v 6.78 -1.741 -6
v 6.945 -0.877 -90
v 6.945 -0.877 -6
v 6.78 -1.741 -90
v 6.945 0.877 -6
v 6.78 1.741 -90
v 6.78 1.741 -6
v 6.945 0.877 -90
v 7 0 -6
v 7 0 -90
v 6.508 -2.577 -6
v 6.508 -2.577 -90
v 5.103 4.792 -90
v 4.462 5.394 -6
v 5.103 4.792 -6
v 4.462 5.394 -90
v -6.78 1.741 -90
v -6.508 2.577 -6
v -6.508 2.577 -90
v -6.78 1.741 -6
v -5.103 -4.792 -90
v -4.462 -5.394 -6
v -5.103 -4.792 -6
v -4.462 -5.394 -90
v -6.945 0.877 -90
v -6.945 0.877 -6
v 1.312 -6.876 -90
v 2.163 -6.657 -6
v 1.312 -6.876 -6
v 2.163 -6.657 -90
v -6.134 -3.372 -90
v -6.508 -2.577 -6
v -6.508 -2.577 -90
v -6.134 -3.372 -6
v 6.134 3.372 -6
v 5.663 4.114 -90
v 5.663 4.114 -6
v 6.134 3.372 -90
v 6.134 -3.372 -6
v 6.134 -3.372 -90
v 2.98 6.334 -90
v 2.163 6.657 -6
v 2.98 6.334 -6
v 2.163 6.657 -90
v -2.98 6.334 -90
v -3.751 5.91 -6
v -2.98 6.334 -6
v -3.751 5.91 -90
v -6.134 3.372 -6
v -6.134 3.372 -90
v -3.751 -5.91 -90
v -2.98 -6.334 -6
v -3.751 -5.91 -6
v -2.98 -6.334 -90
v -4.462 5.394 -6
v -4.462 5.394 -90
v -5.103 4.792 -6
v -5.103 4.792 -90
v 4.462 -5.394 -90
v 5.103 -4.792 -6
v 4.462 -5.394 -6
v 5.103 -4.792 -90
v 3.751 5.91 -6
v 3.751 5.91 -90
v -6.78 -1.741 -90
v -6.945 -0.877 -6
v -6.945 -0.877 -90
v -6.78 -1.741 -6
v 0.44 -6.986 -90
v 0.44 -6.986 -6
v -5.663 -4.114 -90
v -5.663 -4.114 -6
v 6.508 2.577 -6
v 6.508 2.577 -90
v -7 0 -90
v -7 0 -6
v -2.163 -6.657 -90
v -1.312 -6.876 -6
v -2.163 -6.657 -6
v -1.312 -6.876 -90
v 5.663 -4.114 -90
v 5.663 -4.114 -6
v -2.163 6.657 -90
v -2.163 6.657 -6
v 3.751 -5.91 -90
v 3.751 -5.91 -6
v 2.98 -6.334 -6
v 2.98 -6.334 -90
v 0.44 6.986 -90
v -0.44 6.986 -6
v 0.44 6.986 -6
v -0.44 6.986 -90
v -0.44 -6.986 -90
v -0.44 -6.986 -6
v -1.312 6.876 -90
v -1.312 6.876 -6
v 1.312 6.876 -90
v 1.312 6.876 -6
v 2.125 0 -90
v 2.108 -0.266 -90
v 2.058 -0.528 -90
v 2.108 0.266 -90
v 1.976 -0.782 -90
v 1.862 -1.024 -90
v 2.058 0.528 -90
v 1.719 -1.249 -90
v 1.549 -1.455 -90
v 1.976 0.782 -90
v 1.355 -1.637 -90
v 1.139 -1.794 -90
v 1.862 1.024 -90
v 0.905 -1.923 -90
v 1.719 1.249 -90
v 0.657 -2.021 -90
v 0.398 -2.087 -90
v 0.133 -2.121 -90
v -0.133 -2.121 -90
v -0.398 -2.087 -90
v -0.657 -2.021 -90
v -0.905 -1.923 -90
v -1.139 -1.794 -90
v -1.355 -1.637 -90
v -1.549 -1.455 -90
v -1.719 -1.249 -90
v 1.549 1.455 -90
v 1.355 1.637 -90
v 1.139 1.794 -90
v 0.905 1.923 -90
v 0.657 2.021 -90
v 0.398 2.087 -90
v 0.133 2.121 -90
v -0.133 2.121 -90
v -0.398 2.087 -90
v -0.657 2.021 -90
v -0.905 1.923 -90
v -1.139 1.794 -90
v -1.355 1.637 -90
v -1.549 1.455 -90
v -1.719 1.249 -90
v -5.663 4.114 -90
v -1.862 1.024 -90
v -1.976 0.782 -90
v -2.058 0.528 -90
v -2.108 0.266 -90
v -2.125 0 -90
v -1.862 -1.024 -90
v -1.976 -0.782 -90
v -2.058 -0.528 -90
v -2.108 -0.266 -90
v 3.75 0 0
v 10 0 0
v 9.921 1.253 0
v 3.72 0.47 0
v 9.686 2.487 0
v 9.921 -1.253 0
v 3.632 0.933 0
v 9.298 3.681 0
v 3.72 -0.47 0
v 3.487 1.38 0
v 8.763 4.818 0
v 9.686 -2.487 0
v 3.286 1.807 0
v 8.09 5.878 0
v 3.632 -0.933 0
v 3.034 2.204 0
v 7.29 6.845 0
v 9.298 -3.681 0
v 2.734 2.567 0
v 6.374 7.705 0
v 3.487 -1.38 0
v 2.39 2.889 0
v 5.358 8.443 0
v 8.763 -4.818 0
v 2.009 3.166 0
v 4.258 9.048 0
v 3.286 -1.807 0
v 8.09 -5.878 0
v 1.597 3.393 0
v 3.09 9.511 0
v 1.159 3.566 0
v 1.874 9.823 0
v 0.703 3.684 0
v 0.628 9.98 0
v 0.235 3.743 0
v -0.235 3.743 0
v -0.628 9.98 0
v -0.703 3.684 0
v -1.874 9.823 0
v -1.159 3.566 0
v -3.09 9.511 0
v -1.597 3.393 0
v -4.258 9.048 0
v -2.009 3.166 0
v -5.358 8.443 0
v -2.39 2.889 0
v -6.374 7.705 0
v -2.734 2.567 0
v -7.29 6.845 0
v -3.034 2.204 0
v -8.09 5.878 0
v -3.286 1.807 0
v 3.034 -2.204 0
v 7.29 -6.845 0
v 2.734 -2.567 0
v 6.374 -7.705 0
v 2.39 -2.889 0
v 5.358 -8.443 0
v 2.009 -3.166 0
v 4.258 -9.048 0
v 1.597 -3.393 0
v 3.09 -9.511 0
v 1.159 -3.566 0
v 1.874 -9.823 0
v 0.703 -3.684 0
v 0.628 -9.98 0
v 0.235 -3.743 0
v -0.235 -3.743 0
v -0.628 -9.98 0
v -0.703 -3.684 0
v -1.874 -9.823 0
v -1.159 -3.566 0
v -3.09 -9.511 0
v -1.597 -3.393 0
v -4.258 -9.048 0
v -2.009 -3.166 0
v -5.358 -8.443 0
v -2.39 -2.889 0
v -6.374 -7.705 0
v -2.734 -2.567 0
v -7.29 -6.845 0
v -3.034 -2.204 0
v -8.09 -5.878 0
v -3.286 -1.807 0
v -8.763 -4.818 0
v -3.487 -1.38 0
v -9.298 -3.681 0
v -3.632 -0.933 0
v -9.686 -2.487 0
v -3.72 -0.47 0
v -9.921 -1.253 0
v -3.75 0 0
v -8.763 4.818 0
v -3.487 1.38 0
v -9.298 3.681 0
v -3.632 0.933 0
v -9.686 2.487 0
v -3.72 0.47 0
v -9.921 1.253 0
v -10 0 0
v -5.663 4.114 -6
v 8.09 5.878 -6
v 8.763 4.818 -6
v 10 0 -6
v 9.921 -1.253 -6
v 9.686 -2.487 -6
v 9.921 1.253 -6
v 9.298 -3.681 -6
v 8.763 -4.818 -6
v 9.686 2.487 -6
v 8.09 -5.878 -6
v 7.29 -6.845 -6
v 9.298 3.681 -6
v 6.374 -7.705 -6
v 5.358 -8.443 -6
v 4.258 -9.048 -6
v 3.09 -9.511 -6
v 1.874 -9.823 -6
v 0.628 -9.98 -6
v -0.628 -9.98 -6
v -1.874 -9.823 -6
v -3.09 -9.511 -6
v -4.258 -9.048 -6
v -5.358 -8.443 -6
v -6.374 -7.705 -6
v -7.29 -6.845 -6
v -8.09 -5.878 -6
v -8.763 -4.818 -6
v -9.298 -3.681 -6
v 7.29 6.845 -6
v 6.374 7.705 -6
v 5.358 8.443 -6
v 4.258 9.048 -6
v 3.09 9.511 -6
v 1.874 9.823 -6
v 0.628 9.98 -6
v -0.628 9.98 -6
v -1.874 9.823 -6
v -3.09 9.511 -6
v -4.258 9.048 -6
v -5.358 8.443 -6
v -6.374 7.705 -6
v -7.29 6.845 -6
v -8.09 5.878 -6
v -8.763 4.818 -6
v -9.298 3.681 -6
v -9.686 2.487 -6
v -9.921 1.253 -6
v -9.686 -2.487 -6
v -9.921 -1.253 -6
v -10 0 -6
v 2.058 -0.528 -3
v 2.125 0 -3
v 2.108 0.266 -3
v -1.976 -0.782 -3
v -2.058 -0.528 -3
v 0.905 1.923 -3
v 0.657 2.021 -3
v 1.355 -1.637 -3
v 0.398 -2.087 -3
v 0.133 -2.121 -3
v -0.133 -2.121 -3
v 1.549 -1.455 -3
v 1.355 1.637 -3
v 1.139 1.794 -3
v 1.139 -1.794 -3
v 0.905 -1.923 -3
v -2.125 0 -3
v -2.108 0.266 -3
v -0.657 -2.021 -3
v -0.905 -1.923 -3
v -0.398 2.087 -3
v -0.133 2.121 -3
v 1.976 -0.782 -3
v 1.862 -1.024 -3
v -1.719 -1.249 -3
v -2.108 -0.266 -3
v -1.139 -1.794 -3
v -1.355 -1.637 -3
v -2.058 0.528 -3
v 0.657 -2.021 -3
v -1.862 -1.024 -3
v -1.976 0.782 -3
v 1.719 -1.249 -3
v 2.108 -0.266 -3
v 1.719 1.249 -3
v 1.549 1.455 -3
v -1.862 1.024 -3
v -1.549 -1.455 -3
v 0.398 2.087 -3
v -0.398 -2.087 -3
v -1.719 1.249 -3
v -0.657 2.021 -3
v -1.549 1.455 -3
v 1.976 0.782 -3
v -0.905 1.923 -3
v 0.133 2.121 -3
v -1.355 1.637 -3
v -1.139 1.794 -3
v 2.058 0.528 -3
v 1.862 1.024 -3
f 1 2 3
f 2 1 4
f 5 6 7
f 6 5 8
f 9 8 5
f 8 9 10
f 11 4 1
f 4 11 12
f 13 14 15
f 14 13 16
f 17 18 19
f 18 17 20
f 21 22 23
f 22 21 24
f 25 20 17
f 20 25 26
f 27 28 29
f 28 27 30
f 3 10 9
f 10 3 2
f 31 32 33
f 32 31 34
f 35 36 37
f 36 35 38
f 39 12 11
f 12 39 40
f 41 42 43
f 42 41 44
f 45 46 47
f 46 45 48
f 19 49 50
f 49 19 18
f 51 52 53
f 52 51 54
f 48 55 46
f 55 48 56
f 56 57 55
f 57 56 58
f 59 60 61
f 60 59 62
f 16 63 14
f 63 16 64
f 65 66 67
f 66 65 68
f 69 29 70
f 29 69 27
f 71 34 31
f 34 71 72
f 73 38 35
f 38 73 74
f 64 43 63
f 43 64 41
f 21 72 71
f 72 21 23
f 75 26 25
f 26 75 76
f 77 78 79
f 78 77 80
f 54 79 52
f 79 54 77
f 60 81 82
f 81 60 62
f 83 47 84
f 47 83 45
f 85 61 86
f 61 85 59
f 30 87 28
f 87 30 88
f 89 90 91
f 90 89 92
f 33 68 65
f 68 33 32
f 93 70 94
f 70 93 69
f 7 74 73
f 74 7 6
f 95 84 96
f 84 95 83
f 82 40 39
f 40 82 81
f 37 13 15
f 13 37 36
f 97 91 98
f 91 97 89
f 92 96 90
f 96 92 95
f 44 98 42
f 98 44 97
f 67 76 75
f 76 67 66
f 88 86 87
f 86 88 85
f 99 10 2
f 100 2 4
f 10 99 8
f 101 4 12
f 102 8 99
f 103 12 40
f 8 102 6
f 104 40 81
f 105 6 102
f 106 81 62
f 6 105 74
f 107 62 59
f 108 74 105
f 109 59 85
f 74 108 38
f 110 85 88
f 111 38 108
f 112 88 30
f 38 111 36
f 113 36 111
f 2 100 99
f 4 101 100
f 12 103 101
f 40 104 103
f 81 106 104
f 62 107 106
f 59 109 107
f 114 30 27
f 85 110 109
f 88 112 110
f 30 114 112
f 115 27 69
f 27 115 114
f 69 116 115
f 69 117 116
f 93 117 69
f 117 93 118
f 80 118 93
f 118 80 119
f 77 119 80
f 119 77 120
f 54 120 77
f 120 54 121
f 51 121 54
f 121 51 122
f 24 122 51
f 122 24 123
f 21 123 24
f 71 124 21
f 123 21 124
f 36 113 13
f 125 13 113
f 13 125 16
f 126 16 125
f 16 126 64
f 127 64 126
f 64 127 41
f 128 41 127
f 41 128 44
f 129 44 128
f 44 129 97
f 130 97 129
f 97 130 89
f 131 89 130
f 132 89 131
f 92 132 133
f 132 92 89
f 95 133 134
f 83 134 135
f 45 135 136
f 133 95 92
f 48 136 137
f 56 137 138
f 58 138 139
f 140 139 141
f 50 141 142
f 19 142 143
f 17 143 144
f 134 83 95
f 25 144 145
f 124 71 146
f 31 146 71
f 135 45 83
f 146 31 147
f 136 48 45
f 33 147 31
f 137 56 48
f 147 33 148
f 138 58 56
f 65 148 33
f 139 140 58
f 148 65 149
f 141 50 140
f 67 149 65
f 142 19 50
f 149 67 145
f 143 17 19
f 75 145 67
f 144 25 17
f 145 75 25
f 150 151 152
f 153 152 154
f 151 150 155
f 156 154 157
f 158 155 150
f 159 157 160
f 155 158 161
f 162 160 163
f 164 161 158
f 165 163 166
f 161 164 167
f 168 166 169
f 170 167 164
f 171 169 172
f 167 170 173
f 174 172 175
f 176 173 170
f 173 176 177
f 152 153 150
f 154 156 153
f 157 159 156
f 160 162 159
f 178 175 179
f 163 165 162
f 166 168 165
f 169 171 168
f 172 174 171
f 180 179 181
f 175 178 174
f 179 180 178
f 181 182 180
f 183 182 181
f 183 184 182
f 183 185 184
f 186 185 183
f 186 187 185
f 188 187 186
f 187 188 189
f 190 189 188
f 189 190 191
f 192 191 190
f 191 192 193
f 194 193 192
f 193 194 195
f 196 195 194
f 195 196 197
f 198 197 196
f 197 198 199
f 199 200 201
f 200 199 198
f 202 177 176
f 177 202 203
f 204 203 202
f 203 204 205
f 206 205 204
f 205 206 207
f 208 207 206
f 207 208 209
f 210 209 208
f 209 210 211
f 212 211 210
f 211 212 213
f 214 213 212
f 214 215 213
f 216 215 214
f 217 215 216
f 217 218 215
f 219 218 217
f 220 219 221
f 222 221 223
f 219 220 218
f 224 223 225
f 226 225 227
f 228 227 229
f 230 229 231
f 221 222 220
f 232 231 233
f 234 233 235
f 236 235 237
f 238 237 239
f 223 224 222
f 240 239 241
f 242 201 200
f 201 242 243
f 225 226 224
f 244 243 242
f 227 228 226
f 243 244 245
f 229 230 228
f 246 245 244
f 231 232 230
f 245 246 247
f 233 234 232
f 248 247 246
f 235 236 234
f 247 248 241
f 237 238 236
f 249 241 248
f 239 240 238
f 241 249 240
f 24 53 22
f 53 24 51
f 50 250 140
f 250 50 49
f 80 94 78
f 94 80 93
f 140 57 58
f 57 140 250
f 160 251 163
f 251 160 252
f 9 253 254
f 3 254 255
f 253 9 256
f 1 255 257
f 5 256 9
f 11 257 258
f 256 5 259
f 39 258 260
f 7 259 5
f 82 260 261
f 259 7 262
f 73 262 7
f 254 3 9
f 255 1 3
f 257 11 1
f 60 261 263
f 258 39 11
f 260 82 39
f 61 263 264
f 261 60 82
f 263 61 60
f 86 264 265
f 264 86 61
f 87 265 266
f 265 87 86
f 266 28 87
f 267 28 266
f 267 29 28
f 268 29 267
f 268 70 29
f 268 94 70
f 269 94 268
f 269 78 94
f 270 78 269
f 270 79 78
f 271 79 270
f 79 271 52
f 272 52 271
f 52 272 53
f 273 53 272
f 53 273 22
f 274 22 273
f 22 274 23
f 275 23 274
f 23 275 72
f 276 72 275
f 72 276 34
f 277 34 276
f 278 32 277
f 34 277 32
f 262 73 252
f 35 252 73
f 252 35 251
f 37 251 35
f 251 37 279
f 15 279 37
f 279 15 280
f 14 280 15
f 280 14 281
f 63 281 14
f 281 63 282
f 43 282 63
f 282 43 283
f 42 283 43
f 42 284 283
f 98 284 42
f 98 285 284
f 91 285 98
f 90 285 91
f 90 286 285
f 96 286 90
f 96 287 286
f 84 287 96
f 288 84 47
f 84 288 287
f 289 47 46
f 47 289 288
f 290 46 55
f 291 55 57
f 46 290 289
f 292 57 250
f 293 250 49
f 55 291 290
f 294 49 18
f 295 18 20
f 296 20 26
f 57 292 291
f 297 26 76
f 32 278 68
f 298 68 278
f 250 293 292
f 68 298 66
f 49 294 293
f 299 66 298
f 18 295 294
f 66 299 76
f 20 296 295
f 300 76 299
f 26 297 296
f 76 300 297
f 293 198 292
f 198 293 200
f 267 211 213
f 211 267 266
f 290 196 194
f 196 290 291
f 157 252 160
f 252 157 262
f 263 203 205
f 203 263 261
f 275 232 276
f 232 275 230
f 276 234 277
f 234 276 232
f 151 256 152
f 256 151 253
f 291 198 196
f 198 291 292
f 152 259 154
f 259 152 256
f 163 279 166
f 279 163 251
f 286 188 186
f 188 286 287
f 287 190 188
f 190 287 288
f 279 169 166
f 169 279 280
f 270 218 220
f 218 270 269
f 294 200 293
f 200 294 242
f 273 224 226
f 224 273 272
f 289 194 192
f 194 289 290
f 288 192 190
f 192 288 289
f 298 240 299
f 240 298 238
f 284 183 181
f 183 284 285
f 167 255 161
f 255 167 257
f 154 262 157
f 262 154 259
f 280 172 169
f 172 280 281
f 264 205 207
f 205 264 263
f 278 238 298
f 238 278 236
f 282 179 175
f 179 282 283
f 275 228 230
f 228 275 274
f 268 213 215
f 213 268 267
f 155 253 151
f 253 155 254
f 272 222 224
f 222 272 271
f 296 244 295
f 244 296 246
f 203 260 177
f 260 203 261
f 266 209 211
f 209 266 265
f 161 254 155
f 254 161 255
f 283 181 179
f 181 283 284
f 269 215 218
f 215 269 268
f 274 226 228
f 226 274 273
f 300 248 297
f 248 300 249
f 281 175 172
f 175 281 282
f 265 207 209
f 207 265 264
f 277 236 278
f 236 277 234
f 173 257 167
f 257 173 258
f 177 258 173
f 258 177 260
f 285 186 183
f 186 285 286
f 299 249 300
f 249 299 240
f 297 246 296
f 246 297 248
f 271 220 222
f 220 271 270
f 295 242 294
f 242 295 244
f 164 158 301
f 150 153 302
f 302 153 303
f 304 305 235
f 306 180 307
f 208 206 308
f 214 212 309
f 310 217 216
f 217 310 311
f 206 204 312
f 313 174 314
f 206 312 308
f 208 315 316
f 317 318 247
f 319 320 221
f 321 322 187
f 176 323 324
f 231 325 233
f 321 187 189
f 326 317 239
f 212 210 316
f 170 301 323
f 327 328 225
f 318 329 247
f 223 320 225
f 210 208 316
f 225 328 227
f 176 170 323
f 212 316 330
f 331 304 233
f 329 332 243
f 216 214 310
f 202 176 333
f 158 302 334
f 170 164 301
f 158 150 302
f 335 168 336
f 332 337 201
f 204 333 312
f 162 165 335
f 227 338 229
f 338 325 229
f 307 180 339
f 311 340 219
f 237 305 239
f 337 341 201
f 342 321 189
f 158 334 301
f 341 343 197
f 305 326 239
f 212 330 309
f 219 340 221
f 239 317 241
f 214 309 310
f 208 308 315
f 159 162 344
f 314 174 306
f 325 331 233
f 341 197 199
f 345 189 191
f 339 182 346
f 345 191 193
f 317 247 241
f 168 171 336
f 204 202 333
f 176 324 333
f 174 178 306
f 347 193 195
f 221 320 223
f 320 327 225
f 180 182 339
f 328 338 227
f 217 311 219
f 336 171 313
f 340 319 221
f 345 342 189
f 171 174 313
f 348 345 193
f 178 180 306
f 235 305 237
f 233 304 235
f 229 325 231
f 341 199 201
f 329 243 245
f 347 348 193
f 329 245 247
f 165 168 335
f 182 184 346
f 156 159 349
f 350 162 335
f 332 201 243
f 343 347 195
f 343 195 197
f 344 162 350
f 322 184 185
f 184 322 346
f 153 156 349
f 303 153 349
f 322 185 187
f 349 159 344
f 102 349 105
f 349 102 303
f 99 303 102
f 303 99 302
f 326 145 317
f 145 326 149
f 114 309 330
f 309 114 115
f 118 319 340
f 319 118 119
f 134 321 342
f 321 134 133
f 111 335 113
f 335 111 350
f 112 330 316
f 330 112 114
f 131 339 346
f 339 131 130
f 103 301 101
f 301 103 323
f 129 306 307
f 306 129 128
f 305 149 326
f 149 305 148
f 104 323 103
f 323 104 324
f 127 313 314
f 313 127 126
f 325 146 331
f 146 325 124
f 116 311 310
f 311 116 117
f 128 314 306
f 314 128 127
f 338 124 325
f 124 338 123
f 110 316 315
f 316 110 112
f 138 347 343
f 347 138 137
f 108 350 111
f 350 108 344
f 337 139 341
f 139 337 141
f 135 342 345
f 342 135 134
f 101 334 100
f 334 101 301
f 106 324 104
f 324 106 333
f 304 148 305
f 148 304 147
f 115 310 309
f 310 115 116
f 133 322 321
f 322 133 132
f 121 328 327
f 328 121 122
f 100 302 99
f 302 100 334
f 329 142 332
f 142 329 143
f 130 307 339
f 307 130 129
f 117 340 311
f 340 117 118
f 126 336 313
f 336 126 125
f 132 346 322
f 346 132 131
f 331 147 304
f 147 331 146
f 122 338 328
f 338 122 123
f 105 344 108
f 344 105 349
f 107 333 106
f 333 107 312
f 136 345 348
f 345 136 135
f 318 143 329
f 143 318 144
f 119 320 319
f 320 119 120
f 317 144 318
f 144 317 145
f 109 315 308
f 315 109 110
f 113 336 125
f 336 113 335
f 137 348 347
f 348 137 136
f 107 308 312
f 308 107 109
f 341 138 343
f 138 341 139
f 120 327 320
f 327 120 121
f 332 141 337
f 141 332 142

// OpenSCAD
$fn = 50;


difference() {
	union() {
		translate(v = [0, 0, -90.0000000000]) {
			cylinder(h = 90, r = 7.0000000000);
		}
		translate(v = [0, 0, -6.0000000000]) {
			cylinder(h = 6, r = 10.0000000000);
		}
	}
	union() {
		translate(v = [0, 0, 0]) {
			rotate(a = [0, 0, 0]) {
				difference() {
					union() {
						#translate(v = [0, 0, -90.0000000000]) {
							cylinder(h = 90, r = 2.0000000000);
						}
						#translate(v = [0, 0, -3]) {
							cylinder(h = 3, r1 = 2.1250000000, r2 = 3.7500000000);
						}
						#translate(v = [0, 0, -90.0000000000]) {
							cylinder(h = 90, r = 2.1250000000);
						}
						#translate(v = [0, 0, -90.0000000000]) {
							cylinder(h = 90, r = 2.0000000000);
						}
					}
					union();
				}
			}
		}
	}
}
